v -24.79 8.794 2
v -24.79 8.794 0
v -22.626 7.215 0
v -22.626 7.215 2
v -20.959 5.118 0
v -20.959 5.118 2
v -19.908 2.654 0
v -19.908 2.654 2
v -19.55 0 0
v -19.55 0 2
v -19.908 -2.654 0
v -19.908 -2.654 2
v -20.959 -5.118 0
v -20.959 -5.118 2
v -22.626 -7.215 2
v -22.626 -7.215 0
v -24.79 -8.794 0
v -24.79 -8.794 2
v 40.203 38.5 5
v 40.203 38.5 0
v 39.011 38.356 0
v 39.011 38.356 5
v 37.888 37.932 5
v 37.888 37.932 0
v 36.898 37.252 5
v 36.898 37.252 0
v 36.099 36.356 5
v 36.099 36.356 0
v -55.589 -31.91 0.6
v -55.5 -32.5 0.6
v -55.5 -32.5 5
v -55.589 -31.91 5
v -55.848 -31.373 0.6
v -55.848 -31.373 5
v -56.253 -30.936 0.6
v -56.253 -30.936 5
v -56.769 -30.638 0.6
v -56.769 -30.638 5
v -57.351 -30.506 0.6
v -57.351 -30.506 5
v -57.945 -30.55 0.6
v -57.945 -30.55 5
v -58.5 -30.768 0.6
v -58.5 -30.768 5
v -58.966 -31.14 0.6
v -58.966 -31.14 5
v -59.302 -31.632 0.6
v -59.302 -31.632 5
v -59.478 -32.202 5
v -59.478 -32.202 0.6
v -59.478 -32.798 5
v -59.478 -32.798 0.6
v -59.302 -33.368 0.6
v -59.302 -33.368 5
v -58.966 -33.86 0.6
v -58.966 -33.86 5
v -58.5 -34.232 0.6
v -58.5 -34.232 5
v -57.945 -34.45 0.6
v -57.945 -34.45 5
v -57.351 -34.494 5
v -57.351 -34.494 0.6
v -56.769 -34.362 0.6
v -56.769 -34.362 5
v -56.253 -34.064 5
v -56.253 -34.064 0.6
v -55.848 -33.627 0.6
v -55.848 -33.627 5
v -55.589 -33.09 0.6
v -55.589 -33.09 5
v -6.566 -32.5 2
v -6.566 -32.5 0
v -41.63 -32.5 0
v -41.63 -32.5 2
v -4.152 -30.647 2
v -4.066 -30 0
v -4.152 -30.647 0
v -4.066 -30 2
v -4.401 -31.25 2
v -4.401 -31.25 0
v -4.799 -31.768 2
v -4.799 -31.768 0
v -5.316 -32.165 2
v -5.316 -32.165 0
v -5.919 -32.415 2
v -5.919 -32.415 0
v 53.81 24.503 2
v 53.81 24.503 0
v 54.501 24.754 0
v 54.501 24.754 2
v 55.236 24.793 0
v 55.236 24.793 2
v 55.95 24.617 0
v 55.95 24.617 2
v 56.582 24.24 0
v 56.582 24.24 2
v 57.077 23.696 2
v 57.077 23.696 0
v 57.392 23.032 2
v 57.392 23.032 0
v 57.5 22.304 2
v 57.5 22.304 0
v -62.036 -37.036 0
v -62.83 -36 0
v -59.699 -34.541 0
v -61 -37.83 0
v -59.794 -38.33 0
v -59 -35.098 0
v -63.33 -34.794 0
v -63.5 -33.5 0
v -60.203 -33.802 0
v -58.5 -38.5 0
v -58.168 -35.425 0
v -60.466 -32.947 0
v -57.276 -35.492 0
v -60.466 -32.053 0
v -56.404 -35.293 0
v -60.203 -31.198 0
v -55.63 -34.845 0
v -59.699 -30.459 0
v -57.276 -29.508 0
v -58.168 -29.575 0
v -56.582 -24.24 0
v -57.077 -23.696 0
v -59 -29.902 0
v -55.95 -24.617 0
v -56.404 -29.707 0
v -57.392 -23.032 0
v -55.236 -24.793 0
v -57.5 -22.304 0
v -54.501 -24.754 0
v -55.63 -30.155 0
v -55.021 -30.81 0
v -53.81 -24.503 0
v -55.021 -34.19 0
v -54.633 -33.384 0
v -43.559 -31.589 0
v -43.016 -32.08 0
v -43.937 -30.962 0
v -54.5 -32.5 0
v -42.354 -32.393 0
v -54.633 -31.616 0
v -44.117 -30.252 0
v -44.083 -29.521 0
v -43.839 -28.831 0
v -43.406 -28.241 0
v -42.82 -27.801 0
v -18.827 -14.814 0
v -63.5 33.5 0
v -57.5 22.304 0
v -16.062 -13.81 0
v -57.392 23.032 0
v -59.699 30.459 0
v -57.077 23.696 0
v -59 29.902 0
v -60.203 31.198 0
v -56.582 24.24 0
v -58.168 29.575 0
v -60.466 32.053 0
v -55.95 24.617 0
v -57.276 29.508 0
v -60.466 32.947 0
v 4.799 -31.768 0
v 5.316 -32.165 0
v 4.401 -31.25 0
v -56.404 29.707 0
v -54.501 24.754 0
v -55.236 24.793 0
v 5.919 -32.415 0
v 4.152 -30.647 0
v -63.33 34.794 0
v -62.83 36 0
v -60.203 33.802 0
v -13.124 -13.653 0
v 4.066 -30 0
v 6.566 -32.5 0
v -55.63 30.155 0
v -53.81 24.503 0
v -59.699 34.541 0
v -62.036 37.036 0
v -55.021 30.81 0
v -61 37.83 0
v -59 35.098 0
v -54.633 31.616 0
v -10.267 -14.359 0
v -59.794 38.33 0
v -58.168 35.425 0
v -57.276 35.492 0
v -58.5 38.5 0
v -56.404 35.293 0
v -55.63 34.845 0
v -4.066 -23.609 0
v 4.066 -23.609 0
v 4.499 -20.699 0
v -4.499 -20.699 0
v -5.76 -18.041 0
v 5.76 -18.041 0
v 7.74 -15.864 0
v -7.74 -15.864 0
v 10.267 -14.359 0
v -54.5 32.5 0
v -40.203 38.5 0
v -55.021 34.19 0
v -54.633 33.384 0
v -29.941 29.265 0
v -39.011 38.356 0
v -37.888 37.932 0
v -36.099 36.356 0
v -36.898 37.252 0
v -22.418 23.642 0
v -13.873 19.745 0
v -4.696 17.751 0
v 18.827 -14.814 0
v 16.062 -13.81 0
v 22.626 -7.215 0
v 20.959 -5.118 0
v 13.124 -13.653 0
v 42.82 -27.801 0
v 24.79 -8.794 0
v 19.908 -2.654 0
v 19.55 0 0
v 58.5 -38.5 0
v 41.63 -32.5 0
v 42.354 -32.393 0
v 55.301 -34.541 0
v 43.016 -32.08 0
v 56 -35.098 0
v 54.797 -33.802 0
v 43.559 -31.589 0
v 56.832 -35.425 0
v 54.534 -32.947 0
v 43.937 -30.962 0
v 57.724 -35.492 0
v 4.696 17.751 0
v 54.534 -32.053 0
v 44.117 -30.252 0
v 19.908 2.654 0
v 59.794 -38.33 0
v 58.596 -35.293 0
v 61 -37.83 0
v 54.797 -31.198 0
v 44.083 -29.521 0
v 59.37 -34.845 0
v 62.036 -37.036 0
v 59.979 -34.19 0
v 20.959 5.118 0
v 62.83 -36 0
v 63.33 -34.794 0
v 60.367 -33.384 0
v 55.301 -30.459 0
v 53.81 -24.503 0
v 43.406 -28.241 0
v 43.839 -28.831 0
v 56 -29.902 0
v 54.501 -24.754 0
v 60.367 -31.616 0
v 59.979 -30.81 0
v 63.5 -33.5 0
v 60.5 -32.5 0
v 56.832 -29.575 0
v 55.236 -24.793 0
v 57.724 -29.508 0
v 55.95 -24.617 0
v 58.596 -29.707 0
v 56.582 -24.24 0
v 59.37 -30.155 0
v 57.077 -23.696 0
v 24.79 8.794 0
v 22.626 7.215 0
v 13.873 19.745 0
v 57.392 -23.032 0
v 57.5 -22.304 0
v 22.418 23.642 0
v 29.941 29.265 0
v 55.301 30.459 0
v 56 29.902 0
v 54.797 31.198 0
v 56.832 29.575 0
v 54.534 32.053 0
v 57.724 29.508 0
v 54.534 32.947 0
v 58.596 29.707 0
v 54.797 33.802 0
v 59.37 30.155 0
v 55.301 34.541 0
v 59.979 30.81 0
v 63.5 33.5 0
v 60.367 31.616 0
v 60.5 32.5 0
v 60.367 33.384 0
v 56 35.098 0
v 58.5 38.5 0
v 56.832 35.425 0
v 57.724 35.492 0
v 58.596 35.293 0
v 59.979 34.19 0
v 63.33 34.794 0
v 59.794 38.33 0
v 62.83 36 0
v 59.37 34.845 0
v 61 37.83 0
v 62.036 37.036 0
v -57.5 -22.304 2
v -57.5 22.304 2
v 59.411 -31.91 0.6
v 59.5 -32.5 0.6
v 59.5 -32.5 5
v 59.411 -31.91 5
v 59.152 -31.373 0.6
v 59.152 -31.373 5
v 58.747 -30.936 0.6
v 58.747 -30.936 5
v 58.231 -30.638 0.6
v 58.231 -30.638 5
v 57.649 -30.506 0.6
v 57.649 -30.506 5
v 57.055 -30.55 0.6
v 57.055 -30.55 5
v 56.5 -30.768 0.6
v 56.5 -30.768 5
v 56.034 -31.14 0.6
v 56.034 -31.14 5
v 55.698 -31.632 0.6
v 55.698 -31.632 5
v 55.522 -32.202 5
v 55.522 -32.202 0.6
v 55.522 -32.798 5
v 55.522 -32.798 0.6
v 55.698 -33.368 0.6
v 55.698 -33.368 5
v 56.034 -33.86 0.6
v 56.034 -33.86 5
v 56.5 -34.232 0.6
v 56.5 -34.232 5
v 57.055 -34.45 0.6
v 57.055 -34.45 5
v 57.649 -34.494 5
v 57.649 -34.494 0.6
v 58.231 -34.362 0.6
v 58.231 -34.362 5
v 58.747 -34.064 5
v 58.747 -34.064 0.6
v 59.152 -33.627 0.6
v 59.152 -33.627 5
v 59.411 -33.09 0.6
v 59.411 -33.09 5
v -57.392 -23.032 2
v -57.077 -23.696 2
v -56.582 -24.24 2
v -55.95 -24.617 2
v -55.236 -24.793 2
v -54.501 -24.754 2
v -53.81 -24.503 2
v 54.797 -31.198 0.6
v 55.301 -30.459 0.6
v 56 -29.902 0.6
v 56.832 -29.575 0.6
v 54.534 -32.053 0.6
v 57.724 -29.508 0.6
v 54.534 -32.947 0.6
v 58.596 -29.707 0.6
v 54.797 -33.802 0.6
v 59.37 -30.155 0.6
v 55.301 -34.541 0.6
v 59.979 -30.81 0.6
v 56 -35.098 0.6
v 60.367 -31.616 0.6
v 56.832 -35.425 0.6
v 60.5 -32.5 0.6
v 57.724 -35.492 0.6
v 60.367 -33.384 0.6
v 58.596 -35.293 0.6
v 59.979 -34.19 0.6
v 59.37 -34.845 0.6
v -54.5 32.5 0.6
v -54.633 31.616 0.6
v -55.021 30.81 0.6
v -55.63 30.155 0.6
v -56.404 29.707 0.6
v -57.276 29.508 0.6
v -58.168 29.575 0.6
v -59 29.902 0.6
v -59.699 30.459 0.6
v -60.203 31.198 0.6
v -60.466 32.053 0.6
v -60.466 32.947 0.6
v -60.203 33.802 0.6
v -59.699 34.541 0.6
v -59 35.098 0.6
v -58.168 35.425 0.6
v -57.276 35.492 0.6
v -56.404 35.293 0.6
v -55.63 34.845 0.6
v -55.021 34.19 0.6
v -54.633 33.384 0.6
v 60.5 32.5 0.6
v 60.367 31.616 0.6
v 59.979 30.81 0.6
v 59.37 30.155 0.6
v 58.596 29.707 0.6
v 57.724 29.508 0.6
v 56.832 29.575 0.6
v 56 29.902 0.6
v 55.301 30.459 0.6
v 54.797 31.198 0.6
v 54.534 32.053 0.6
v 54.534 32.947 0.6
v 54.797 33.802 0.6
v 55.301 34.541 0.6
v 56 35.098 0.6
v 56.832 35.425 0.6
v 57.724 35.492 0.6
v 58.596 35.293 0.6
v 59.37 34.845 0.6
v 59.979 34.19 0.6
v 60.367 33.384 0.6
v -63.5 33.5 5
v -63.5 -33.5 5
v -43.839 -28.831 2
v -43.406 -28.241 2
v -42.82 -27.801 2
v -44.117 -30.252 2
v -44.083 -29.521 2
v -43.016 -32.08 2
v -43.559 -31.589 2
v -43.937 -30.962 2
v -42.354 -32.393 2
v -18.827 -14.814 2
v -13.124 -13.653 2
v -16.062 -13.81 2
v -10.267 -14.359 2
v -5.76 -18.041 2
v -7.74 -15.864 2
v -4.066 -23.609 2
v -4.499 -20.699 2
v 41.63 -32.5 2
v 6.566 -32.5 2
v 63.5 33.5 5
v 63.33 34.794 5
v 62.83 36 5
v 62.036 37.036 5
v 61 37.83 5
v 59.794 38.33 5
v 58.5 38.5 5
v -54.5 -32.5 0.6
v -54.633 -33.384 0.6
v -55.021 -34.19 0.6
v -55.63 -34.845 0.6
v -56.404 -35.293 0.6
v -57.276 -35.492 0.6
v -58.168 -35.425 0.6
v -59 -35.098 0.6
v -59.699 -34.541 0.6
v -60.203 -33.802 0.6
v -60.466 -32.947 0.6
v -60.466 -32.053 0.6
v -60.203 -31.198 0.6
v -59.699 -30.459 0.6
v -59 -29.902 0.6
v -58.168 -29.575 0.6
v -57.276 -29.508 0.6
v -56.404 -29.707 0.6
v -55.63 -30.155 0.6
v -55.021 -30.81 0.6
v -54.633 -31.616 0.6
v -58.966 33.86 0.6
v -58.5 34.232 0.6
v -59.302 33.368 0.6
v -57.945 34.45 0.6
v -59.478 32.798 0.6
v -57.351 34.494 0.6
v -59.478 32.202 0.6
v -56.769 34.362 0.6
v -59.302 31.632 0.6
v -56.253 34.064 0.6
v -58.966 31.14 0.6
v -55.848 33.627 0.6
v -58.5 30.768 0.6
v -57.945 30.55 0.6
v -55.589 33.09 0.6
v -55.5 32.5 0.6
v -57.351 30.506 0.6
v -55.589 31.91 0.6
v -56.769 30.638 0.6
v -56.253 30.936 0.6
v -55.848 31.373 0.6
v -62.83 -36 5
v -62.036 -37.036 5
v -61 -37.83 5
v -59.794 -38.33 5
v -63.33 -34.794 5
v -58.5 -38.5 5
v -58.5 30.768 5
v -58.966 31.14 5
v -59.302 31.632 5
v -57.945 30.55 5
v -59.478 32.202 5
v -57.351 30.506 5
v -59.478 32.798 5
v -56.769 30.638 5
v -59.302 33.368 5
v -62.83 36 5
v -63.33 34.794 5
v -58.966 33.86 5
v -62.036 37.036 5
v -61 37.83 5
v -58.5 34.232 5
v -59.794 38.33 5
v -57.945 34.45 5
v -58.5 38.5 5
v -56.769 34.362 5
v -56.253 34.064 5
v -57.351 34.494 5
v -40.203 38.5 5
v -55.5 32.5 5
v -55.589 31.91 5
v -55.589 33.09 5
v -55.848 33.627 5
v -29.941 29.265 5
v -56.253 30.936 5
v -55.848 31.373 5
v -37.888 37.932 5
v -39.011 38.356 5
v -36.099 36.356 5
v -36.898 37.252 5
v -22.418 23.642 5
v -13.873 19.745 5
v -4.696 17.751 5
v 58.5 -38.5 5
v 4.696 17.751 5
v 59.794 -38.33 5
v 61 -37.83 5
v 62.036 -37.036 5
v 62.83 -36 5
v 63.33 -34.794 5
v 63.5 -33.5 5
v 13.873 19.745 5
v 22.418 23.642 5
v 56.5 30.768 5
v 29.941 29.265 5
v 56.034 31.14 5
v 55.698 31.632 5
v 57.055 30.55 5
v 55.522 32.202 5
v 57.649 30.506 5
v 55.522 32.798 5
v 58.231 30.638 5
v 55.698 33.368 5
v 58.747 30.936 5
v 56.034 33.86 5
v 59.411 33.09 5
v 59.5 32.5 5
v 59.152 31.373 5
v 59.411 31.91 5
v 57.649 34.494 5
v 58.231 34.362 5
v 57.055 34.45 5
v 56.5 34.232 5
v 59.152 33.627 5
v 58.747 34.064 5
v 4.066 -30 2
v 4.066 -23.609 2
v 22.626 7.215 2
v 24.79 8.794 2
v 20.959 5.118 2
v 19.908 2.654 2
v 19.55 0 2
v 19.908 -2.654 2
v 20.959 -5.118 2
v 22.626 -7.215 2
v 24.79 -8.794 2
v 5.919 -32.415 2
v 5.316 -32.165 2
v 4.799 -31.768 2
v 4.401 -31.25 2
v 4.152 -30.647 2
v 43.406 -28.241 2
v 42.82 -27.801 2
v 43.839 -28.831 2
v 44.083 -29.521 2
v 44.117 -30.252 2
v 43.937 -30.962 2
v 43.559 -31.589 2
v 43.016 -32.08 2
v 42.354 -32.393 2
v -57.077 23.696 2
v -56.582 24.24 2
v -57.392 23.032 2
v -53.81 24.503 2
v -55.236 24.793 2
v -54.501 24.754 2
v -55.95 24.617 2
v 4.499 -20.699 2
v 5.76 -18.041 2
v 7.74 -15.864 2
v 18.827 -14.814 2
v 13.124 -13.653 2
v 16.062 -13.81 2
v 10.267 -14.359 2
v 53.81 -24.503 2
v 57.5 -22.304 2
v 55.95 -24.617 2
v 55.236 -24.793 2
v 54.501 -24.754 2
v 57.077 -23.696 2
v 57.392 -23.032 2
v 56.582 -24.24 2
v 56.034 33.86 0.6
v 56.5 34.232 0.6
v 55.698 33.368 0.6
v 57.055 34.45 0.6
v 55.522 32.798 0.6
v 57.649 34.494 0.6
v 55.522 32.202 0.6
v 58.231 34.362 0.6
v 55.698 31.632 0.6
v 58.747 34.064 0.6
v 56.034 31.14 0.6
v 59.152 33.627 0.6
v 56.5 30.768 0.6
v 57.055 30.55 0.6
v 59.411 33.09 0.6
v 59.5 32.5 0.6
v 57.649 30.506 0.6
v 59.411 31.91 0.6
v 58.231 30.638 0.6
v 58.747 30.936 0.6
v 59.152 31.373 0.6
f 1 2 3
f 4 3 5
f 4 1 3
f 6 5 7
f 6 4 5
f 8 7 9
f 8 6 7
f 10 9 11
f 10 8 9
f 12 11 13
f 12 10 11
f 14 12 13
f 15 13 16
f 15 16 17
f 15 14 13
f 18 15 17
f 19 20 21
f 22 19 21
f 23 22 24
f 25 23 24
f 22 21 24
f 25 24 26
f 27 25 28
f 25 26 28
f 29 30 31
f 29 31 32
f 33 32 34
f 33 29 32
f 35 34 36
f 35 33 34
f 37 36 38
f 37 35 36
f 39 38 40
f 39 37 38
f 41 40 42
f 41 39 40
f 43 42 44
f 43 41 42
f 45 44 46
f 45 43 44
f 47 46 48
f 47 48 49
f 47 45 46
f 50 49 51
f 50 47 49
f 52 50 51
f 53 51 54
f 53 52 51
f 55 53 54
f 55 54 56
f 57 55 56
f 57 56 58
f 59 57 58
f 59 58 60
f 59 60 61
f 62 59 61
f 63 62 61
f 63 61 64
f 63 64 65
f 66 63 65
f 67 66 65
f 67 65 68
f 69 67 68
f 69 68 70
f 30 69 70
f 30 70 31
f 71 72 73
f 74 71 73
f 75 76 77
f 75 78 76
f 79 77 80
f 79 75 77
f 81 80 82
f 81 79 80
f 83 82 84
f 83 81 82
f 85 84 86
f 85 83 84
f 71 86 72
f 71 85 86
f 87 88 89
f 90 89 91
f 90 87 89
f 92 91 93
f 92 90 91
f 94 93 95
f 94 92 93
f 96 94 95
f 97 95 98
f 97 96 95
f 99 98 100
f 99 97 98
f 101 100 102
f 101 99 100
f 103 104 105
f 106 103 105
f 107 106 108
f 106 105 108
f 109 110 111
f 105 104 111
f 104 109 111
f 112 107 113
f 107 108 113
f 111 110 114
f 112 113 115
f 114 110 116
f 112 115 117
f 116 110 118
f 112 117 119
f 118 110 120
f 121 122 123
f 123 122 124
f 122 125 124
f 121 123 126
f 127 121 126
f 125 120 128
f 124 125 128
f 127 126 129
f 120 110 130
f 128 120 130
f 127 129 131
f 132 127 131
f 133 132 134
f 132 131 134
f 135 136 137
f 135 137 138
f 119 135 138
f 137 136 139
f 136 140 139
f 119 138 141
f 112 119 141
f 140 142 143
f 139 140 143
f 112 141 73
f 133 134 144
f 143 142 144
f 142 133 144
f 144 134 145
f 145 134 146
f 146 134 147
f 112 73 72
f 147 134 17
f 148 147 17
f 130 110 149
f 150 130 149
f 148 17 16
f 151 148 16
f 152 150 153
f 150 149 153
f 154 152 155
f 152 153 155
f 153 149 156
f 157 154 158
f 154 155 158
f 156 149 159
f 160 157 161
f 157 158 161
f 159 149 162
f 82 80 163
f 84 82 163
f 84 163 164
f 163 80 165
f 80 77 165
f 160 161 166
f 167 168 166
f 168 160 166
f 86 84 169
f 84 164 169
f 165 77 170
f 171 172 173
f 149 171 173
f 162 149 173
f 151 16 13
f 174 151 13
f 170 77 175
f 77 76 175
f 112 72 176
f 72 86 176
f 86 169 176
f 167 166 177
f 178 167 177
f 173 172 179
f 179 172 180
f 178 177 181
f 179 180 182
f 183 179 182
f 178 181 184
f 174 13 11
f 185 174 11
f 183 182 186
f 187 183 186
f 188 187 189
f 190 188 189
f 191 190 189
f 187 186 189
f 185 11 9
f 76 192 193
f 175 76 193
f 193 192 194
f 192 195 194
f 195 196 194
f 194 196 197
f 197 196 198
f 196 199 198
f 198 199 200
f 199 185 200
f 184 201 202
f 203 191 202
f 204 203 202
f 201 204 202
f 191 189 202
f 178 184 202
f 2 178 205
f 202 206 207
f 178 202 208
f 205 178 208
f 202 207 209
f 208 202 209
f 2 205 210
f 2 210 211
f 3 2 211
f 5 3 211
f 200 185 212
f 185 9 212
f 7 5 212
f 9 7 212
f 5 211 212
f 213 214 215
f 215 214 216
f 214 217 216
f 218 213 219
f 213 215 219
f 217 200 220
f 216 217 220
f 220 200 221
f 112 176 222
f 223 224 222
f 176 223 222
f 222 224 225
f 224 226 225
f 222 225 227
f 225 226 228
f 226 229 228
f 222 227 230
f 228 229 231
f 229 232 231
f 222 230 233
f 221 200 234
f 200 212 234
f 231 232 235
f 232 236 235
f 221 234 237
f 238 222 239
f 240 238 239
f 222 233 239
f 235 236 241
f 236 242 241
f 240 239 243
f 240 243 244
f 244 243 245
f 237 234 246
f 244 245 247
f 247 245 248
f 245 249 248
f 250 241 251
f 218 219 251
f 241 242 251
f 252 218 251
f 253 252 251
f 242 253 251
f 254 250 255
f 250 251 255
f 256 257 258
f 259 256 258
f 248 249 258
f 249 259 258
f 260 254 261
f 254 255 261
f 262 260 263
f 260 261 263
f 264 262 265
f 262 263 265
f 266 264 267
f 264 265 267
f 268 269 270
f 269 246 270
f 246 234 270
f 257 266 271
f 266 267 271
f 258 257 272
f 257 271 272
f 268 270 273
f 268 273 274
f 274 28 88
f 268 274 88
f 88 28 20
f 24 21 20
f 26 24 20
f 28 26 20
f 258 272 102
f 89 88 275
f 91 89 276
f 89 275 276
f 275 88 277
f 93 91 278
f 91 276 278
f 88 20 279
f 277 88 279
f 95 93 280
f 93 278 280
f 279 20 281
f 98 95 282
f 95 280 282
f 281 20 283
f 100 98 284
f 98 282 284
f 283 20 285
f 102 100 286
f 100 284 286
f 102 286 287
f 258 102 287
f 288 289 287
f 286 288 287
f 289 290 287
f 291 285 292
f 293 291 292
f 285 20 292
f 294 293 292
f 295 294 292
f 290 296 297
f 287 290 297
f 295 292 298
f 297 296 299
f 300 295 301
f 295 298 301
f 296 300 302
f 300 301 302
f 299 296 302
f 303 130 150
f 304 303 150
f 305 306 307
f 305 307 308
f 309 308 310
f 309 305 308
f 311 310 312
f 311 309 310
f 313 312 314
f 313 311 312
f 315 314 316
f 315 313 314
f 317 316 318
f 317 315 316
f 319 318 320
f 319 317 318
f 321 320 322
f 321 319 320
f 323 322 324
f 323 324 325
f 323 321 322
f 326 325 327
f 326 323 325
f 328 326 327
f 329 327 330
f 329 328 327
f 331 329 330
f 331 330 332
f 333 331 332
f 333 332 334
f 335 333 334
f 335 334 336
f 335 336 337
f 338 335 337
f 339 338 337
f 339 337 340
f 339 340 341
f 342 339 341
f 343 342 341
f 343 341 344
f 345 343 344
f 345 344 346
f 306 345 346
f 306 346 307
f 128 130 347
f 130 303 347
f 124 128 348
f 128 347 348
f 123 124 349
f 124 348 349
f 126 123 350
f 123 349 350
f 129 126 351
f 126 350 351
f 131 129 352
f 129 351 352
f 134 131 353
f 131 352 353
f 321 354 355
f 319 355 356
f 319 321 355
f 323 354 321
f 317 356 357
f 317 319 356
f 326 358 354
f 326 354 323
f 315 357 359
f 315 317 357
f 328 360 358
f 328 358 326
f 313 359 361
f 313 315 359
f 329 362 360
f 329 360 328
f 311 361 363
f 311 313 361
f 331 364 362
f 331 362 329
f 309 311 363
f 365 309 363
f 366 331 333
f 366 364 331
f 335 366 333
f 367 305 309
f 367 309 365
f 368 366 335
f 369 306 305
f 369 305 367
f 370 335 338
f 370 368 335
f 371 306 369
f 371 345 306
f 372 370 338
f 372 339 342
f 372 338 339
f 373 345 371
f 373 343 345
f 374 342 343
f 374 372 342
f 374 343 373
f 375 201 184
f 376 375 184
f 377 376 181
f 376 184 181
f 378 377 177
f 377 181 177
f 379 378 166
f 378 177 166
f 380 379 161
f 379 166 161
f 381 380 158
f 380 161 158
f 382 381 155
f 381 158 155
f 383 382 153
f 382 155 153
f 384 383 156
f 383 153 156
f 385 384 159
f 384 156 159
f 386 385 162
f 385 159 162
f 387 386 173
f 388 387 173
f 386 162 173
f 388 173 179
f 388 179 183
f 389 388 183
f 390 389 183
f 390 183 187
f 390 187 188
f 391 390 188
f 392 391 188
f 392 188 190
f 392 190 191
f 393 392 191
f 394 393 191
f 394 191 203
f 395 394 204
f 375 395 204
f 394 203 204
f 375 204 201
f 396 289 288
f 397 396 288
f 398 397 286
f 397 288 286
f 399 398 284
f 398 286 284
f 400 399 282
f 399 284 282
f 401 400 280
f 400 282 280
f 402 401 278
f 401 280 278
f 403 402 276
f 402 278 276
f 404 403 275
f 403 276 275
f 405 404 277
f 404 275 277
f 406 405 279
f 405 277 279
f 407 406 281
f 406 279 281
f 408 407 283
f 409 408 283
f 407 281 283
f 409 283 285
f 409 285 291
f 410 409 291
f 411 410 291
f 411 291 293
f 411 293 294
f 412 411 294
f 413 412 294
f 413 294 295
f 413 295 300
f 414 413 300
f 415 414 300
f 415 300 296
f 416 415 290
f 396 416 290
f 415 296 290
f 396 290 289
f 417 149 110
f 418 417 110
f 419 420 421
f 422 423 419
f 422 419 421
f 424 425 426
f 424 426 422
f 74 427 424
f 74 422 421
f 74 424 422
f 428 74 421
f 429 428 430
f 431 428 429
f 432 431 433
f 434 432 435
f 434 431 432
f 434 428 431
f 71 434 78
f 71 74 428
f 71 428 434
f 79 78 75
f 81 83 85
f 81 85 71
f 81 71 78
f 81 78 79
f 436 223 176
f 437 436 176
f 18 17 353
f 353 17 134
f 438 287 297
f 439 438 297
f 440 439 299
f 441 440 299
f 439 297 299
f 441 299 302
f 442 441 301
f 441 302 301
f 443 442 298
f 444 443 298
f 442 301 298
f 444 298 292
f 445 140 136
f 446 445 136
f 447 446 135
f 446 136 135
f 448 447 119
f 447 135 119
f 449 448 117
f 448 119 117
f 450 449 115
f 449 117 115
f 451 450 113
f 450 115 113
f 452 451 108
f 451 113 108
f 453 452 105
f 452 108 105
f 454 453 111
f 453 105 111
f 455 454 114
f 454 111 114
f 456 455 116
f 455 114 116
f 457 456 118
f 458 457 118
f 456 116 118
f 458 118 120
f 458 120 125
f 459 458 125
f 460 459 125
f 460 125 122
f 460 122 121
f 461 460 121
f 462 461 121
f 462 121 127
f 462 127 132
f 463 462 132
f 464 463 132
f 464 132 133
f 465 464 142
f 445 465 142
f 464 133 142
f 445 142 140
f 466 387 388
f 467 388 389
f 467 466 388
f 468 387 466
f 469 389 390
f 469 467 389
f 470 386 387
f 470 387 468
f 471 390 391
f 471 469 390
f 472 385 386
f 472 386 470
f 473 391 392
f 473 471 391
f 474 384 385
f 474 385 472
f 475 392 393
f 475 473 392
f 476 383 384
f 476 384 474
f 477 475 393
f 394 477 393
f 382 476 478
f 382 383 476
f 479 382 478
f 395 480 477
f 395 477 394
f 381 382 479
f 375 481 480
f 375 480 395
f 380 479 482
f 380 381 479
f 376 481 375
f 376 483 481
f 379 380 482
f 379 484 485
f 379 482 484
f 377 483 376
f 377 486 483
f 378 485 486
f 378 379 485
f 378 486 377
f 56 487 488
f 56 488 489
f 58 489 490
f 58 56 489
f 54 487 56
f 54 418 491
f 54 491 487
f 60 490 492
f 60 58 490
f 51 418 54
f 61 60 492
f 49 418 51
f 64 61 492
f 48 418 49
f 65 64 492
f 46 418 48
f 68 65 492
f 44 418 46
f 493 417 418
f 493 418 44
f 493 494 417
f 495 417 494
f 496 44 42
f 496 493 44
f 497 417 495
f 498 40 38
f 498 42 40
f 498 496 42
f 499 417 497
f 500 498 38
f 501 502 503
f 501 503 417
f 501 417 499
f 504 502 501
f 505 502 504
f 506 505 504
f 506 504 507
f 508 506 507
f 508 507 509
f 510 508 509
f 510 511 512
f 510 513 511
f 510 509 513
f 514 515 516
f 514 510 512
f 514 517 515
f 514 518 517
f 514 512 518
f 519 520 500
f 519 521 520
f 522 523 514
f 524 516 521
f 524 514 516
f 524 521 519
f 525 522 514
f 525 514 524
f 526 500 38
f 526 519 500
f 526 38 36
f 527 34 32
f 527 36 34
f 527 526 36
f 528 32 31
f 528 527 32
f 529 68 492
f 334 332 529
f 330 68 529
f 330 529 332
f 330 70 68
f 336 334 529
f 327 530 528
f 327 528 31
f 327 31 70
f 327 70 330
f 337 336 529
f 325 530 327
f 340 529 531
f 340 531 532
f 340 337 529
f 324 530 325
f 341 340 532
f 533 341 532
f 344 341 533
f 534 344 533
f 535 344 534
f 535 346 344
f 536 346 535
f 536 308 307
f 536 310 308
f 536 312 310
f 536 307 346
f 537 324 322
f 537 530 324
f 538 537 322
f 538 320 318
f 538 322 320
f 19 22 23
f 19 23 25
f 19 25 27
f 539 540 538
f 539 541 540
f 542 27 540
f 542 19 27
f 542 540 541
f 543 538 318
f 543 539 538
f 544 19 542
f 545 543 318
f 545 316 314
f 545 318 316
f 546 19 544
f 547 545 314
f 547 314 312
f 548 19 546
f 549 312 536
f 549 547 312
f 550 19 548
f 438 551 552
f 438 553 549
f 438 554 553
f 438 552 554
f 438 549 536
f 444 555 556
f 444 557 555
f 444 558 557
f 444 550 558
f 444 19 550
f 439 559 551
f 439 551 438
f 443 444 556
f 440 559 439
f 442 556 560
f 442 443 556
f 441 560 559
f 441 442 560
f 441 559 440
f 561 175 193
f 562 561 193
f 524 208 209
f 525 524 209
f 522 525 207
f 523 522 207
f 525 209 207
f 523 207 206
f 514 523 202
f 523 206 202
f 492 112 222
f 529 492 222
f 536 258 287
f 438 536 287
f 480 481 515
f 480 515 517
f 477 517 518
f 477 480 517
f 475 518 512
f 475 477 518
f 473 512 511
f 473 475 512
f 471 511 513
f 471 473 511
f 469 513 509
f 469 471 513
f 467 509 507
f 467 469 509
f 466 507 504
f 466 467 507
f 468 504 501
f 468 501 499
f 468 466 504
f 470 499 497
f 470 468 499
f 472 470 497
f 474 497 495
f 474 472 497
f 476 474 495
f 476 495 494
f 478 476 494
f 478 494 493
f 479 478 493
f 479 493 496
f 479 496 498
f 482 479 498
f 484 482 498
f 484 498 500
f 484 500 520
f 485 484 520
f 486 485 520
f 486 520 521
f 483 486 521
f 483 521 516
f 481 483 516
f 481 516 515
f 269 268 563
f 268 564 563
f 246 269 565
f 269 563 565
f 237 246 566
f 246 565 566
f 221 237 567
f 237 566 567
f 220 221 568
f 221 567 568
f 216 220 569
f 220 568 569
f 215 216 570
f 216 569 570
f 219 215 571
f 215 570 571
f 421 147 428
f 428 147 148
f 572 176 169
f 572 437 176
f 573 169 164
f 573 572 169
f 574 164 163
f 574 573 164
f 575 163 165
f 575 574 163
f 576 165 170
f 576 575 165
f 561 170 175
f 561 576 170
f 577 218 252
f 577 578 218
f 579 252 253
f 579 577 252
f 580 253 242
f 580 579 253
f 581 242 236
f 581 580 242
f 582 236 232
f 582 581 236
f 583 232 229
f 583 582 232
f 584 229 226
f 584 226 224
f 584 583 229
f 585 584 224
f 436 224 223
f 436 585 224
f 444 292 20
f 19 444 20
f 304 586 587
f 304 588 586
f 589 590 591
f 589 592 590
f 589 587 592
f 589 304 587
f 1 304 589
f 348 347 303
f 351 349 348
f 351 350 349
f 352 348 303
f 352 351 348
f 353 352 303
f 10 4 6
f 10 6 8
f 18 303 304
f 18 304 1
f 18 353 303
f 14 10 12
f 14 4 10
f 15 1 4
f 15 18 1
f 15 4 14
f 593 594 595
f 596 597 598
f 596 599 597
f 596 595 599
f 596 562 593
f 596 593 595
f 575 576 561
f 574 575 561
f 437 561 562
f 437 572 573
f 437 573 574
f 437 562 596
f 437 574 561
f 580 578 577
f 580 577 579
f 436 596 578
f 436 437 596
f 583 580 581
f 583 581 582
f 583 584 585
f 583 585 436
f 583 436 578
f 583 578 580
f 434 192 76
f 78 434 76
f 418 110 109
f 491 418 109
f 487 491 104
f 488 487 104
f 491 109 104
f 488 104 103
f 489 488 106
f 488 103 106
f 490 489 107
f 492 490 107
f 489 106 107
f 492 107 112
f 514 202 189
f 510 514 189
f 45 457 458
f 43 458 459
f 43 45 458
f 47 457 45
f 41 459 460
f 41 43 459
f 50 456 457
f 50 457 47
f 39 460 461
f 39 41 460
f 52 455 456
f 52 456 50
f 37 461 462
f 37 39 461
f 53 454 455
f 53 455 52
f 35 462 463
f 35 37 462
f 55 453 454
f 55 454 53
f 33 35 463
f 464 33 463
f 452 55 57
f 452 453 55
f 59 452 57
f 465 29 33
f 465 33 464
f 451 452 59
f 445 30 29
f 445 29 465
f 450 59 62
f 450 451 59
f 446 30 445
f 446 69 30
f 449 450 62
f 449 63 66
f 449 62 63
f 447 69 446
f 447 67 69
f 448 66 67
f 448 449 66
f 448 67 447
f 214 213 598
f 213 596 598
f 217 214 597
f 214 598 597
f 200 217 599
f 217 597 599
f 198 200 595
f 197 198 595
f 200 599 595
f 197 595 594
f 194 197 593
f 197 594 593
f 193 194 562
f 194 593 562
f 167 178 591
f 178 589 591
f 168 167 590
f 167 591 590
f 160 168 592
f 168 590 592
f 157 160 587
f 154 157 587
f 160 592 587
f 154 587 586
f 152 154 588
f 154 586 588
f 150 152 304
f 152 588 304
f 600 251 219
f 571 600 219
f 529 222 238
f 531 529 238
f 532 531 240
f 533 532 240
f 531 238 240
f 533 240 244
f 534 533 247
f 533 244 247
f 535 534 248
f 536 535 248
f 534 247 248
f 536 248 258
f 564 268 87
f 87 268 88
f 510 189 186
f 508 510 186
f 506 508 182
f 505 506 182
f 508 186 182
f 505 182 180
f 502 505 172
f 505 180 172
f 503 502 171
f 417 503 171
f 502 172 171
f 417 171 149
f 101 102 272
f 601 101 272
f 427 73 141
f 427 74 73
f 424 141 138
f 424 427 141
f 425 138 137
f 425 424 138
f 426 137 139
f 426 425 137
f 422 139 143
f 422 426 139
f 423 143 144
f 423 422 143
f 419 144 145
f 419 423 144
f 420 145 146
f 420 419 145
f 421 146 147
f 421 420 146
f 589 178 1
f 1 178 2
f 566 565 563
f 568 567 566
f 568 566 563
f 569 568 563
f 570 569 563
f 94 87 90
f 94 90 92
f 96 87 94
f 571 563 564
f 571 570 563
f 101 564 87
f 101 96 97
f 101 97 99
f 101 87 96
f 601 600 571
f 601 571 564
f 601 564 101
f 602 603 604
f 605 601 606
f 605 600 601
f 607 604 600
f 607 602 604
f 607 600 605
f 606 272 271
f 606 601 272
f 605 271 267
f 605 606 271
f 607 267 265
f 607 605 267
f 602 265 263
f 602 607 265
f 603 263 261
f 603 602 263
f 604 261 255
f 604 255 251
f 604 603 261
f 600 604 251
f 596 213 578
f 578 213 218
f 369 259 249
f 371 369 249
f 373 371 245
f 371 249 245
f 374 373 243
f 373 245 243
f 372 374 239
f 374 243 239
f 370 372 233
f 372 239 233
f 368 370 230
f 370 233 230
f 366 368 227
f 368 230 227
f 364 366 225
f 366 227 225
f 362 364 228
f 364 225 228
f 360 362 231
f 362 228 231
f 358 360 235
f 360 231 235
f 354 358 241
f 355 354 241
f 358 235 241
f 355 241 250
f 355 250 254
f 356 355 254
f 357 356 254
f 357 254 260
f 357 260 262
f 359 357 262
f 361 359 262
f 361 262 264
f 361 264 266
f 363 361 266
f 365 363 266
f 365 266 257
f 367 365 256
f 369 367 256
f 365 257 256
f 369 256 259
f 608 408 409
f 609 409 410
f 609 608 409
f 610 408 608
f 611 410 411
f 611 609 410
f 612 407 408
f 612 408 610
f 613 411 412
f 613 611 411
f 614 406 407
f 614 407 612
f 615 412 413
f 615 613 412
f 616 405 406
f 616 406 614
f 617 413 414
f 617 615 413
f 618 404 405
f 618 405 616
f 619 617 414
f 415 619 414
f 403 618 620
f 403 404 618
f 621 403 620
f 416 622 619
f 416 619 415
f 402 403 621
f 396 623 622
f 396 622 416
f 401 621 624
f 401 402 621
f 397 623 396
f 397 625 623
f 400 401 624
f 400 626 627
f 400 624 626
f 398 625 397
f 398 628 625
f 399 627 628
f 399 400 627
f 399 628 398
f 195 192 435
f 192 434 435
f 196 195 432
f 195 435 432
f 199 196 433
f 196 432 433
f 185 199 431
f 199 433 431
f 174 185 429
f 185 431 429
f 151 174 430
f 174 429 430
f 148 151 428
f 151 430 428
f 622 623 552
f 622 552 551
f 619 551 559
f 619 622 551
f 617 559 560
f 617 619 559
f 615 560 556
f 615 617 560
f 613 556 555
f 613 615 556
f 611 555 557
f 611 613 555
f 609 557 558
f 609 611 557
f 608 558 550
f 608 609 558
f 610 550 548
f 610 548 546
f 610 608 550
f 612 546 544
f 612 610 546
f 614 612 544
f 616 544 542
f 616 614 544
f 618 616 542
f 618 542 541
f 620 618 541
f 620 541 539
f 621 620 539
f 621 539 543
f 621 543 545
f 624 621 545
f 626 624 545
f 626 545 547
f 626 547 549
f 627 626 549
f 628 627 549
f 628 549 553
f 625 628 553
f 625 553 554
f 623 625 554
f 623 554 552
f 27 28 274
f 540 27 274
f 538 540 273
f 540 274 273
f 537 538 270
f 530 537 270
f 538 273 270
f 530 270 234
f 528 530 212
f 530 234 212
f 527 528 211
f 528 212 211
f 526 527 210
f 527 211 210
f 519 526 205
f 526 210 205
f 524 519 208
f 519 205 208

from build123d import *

# Parameters (mm, degrees)
F0_R     = 2
F1_DEPTH = 5
F2_R     = 3
F3_DEPTH = 0.6
F5_DEPTH = 2
F6_R     = 10
F7_R     = 2.5


with BuildPart() as f1:
    # F0 (on Top) → F1 (new body)
    with BuildSketch(Plane.XY):
        with BuildLine():
            Line((-58.5, -38.5), (58.5, -38.5))
            ThreePointArc((58.5, -38.5), (62.0355339059, -37.0355339059), (63.5, -33.5))
            Line((63.5, -33.5), (63.5, 33.5))
            ThreePointArc((63.5, 33.5), (62.0355339059, 37.0355339059), (58.5, 38.5))
            Line((58.5, 38.5), (40.2026118555, 38.5))
            ThreePointArc((40.2026118555, 38.5), (37.8876397432, 37.9318059659), (36.0988089683, 36.3563616478))
            ThreePointArc((36.0988089683, 36.3563616478), (0, 17.5), (-36.0988089683, 36.3563616478))
            ThreePointArc((-36.0988089683, 36.3563616478), (-37.8876397432, 37.9318059659), (-40.2026118555, 38.5))
            Line((-40.2026118555, 38.5), (-58.5, 38.5))
            ThreePointArc((-58.5, 38.5), (-62.0355339059, 37.0355339059), (-63.5, 33.5))
            Line((-63.5, 33.5), (-63.5, -33.5))
            ThreePointArc((-63.5, -33.5), (-62.0355339059, -37.0355339059), (-58.5, -38.5))
        make_face()
        with Locations((-57.5, -32.5)):
            Circle(F0_R, mode=Mode.SUBTRACT)
        with Locations((57.5, -32.5)):
            Circle(F0_R, mode=Mode.SUBTRACT)
        with Locations((-57.5, 32.5)):
            Circle(F0_R, mode=Mode.SUBTRACT)
        with Locations((57.5, 32.5)):
            Circle(F0_R, mode=Mode.SUBTRACT)
    extrude(amount=F1_DEPTH)

    # F2 (on face) → F3 (cut)
    with BuildSketch(Plane(origin=(0, 0, 0), x_dir=(1, 0, 0), z_dir=(0, 0, -1))):
        with Locations((-57.5, 32.5)):
            Circle(F2_R)
        with Locations((57.5, 32.5)):
            Circle(F2_R)
        with Locations((57.5, -32.5)):
            Circle(F2_R)
        with Locations((-57.5, -32.5)):
            Circle(F2_R)
    extrude(amount=-F3_DEPTH, mode=Mode.SUBTRACT)

    # F4 (on face) → F5 (cut)
    with BuildSketch(Plane(origin=(0, 0, 0), x_dir=(1, 0, 0), z_dir=(0, 0, -1))):
        Polygon((-8.542372966, 0), (-57.5000000613, 26.5), (-57.5, -26.5), align=None)
        Polygon((-4.0665, 32.5000000613), (-51.5, 32.5000000613), (-4.0665, 6.8249862876), align=None)
        Polygon((51.5, 32.5000000613), (4.0665, 32.5000000613), (4.0665, 6.8249862876), align=None)
        Polygon((57.5000000613, 26.5), (8.542372966, 0), (57.5000000613, -26.5), align=None)
    extrude(amount=-F5_DEPTH, mode=Mode.SUBTRACT)

    # F6
    f6_edges = [f1.edges().sort_by_distance(p)[0] for p in [
        (8.542373, 0, 1),
        (-8.542373, 0, 1),
        (-4.0665, -6.824986, 1),
        (4.0665, -6.824986, 1),
    ]]
    fillet(f6_edges, radius=F6_R)

    # F7
    f7_edges = [f1.edges().sort_by_distance(p)[0] for p in [
        (-51.5, -32.5, 1),
        (51.5, -32.5, 1),
        (57.5, -26.5, 1),
        (57.5, 26.5, 1),
        (-57.5, 26.5, 1),
        (-57.5, -26.5, 1),
        (4.0665, -32.5, 1),
        (-4.0665, -32.5, 1),
    ]]
    fillet(f7_edges, radius=F7_R)


solid = f1.part
